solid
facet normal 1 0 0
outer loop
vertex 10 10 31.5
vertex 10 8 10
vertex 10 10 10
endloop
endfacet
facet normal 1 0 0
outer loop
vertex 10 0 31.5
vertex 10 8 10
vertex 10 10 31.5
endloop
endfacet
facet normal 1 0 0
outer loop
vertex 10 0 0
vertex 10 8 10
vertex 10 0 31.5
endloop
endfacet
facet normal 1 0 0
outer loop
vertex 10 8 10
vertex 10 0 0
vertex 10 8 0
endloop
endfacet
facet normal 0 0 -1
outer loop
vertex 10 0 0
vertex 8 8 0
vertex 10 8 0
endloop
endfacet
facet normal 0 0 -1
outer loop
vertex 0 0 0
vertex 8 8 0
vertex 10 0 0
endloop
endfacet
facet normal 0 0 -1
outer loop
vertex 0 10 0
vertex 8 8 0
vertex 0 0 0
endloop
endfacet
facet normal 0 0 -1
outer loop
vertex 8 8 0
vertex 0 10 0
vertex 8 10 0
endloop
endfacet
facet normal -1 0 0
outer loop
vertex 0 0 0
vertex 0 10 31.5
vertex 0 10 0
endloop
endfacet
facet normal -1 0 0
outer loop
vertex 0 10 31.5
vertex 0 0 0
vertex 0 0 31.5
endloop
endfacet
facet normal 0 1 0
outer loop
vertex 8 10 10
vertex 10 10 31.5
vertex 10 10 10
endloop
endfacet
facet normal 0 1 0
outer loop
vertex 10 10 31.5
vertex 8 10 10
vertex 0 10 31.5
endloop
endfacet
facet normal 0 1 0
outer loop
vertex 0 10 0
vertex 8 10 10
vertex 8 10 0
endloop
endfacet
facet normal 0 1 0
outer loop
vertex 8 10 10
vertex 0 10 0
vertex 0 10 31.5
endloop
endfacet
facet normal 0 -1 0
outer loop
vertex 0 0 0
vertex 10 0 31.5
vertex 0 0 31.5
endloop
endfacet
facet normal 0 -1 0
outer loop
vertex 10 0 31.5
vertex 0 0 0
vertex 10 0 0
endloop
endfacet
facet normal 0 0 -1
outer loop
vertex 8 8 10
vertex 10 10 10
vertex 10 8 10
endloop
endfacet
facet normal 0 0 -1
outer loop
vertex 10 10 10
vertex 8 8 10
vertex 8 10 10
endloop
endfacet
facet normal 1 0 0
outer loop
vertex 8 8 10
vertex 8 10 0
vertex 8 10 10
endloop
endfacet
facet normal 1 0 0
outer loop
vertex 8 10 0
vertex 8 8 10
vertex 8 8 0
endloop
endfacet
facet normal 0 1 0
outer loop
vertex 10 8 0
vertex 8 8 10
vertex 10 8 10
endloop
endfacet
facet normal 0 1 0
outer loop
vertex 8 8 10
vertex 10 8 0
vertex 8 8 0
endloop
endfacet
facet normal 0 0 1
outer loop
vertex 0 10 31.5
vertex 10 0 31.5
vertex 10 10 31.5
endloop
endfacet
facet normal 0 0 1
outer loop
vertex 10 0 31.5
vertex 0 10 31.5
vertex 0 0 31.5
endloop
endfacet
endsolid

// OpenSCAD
// file: ../lib/shared-constants.scad
// Included by the lib, to exercise recursive inlining.
NOTCH = 2;
LID_THICKNESS = 1.5;
// file: ../lib/fixture-cube-lib.scad
// Fixture model for model-forge tests. Deliberately trivial so renders are fast.

include <shared-constants.scad>;

// BEGIN_PARAMS

// Edge length of the box (mm).
size = 10;

// Height multiplier.
height_mult = 1;

// Which corner to notch.
corner = "ne";  // [ne, nw, se, sw]

// Cut the notch at all.
notched = true;

// END_PARAMS

module box() {
  difference() {
    cube([size, size, size * height_mult]);
    if (notched) translate([size - NOTCH, size - NOTCH, 0]) cube([NOTCH, NOTCH, size]);
  }
}

module lid() {
  cube([size, size, LID_THICKNESS]);
}
// main file
include <../lib/fixture-cube-lib.scad>;
$fn = 16;

// A preview-local override. It must stay authoritative over a user's value,
// which is the whole reason parameters are injected into the lib rather than
// appended after the consumer.
height_mult = 3;

color("red") box();
color("blue") translate([0, 0, size * height_mult]) lid();
